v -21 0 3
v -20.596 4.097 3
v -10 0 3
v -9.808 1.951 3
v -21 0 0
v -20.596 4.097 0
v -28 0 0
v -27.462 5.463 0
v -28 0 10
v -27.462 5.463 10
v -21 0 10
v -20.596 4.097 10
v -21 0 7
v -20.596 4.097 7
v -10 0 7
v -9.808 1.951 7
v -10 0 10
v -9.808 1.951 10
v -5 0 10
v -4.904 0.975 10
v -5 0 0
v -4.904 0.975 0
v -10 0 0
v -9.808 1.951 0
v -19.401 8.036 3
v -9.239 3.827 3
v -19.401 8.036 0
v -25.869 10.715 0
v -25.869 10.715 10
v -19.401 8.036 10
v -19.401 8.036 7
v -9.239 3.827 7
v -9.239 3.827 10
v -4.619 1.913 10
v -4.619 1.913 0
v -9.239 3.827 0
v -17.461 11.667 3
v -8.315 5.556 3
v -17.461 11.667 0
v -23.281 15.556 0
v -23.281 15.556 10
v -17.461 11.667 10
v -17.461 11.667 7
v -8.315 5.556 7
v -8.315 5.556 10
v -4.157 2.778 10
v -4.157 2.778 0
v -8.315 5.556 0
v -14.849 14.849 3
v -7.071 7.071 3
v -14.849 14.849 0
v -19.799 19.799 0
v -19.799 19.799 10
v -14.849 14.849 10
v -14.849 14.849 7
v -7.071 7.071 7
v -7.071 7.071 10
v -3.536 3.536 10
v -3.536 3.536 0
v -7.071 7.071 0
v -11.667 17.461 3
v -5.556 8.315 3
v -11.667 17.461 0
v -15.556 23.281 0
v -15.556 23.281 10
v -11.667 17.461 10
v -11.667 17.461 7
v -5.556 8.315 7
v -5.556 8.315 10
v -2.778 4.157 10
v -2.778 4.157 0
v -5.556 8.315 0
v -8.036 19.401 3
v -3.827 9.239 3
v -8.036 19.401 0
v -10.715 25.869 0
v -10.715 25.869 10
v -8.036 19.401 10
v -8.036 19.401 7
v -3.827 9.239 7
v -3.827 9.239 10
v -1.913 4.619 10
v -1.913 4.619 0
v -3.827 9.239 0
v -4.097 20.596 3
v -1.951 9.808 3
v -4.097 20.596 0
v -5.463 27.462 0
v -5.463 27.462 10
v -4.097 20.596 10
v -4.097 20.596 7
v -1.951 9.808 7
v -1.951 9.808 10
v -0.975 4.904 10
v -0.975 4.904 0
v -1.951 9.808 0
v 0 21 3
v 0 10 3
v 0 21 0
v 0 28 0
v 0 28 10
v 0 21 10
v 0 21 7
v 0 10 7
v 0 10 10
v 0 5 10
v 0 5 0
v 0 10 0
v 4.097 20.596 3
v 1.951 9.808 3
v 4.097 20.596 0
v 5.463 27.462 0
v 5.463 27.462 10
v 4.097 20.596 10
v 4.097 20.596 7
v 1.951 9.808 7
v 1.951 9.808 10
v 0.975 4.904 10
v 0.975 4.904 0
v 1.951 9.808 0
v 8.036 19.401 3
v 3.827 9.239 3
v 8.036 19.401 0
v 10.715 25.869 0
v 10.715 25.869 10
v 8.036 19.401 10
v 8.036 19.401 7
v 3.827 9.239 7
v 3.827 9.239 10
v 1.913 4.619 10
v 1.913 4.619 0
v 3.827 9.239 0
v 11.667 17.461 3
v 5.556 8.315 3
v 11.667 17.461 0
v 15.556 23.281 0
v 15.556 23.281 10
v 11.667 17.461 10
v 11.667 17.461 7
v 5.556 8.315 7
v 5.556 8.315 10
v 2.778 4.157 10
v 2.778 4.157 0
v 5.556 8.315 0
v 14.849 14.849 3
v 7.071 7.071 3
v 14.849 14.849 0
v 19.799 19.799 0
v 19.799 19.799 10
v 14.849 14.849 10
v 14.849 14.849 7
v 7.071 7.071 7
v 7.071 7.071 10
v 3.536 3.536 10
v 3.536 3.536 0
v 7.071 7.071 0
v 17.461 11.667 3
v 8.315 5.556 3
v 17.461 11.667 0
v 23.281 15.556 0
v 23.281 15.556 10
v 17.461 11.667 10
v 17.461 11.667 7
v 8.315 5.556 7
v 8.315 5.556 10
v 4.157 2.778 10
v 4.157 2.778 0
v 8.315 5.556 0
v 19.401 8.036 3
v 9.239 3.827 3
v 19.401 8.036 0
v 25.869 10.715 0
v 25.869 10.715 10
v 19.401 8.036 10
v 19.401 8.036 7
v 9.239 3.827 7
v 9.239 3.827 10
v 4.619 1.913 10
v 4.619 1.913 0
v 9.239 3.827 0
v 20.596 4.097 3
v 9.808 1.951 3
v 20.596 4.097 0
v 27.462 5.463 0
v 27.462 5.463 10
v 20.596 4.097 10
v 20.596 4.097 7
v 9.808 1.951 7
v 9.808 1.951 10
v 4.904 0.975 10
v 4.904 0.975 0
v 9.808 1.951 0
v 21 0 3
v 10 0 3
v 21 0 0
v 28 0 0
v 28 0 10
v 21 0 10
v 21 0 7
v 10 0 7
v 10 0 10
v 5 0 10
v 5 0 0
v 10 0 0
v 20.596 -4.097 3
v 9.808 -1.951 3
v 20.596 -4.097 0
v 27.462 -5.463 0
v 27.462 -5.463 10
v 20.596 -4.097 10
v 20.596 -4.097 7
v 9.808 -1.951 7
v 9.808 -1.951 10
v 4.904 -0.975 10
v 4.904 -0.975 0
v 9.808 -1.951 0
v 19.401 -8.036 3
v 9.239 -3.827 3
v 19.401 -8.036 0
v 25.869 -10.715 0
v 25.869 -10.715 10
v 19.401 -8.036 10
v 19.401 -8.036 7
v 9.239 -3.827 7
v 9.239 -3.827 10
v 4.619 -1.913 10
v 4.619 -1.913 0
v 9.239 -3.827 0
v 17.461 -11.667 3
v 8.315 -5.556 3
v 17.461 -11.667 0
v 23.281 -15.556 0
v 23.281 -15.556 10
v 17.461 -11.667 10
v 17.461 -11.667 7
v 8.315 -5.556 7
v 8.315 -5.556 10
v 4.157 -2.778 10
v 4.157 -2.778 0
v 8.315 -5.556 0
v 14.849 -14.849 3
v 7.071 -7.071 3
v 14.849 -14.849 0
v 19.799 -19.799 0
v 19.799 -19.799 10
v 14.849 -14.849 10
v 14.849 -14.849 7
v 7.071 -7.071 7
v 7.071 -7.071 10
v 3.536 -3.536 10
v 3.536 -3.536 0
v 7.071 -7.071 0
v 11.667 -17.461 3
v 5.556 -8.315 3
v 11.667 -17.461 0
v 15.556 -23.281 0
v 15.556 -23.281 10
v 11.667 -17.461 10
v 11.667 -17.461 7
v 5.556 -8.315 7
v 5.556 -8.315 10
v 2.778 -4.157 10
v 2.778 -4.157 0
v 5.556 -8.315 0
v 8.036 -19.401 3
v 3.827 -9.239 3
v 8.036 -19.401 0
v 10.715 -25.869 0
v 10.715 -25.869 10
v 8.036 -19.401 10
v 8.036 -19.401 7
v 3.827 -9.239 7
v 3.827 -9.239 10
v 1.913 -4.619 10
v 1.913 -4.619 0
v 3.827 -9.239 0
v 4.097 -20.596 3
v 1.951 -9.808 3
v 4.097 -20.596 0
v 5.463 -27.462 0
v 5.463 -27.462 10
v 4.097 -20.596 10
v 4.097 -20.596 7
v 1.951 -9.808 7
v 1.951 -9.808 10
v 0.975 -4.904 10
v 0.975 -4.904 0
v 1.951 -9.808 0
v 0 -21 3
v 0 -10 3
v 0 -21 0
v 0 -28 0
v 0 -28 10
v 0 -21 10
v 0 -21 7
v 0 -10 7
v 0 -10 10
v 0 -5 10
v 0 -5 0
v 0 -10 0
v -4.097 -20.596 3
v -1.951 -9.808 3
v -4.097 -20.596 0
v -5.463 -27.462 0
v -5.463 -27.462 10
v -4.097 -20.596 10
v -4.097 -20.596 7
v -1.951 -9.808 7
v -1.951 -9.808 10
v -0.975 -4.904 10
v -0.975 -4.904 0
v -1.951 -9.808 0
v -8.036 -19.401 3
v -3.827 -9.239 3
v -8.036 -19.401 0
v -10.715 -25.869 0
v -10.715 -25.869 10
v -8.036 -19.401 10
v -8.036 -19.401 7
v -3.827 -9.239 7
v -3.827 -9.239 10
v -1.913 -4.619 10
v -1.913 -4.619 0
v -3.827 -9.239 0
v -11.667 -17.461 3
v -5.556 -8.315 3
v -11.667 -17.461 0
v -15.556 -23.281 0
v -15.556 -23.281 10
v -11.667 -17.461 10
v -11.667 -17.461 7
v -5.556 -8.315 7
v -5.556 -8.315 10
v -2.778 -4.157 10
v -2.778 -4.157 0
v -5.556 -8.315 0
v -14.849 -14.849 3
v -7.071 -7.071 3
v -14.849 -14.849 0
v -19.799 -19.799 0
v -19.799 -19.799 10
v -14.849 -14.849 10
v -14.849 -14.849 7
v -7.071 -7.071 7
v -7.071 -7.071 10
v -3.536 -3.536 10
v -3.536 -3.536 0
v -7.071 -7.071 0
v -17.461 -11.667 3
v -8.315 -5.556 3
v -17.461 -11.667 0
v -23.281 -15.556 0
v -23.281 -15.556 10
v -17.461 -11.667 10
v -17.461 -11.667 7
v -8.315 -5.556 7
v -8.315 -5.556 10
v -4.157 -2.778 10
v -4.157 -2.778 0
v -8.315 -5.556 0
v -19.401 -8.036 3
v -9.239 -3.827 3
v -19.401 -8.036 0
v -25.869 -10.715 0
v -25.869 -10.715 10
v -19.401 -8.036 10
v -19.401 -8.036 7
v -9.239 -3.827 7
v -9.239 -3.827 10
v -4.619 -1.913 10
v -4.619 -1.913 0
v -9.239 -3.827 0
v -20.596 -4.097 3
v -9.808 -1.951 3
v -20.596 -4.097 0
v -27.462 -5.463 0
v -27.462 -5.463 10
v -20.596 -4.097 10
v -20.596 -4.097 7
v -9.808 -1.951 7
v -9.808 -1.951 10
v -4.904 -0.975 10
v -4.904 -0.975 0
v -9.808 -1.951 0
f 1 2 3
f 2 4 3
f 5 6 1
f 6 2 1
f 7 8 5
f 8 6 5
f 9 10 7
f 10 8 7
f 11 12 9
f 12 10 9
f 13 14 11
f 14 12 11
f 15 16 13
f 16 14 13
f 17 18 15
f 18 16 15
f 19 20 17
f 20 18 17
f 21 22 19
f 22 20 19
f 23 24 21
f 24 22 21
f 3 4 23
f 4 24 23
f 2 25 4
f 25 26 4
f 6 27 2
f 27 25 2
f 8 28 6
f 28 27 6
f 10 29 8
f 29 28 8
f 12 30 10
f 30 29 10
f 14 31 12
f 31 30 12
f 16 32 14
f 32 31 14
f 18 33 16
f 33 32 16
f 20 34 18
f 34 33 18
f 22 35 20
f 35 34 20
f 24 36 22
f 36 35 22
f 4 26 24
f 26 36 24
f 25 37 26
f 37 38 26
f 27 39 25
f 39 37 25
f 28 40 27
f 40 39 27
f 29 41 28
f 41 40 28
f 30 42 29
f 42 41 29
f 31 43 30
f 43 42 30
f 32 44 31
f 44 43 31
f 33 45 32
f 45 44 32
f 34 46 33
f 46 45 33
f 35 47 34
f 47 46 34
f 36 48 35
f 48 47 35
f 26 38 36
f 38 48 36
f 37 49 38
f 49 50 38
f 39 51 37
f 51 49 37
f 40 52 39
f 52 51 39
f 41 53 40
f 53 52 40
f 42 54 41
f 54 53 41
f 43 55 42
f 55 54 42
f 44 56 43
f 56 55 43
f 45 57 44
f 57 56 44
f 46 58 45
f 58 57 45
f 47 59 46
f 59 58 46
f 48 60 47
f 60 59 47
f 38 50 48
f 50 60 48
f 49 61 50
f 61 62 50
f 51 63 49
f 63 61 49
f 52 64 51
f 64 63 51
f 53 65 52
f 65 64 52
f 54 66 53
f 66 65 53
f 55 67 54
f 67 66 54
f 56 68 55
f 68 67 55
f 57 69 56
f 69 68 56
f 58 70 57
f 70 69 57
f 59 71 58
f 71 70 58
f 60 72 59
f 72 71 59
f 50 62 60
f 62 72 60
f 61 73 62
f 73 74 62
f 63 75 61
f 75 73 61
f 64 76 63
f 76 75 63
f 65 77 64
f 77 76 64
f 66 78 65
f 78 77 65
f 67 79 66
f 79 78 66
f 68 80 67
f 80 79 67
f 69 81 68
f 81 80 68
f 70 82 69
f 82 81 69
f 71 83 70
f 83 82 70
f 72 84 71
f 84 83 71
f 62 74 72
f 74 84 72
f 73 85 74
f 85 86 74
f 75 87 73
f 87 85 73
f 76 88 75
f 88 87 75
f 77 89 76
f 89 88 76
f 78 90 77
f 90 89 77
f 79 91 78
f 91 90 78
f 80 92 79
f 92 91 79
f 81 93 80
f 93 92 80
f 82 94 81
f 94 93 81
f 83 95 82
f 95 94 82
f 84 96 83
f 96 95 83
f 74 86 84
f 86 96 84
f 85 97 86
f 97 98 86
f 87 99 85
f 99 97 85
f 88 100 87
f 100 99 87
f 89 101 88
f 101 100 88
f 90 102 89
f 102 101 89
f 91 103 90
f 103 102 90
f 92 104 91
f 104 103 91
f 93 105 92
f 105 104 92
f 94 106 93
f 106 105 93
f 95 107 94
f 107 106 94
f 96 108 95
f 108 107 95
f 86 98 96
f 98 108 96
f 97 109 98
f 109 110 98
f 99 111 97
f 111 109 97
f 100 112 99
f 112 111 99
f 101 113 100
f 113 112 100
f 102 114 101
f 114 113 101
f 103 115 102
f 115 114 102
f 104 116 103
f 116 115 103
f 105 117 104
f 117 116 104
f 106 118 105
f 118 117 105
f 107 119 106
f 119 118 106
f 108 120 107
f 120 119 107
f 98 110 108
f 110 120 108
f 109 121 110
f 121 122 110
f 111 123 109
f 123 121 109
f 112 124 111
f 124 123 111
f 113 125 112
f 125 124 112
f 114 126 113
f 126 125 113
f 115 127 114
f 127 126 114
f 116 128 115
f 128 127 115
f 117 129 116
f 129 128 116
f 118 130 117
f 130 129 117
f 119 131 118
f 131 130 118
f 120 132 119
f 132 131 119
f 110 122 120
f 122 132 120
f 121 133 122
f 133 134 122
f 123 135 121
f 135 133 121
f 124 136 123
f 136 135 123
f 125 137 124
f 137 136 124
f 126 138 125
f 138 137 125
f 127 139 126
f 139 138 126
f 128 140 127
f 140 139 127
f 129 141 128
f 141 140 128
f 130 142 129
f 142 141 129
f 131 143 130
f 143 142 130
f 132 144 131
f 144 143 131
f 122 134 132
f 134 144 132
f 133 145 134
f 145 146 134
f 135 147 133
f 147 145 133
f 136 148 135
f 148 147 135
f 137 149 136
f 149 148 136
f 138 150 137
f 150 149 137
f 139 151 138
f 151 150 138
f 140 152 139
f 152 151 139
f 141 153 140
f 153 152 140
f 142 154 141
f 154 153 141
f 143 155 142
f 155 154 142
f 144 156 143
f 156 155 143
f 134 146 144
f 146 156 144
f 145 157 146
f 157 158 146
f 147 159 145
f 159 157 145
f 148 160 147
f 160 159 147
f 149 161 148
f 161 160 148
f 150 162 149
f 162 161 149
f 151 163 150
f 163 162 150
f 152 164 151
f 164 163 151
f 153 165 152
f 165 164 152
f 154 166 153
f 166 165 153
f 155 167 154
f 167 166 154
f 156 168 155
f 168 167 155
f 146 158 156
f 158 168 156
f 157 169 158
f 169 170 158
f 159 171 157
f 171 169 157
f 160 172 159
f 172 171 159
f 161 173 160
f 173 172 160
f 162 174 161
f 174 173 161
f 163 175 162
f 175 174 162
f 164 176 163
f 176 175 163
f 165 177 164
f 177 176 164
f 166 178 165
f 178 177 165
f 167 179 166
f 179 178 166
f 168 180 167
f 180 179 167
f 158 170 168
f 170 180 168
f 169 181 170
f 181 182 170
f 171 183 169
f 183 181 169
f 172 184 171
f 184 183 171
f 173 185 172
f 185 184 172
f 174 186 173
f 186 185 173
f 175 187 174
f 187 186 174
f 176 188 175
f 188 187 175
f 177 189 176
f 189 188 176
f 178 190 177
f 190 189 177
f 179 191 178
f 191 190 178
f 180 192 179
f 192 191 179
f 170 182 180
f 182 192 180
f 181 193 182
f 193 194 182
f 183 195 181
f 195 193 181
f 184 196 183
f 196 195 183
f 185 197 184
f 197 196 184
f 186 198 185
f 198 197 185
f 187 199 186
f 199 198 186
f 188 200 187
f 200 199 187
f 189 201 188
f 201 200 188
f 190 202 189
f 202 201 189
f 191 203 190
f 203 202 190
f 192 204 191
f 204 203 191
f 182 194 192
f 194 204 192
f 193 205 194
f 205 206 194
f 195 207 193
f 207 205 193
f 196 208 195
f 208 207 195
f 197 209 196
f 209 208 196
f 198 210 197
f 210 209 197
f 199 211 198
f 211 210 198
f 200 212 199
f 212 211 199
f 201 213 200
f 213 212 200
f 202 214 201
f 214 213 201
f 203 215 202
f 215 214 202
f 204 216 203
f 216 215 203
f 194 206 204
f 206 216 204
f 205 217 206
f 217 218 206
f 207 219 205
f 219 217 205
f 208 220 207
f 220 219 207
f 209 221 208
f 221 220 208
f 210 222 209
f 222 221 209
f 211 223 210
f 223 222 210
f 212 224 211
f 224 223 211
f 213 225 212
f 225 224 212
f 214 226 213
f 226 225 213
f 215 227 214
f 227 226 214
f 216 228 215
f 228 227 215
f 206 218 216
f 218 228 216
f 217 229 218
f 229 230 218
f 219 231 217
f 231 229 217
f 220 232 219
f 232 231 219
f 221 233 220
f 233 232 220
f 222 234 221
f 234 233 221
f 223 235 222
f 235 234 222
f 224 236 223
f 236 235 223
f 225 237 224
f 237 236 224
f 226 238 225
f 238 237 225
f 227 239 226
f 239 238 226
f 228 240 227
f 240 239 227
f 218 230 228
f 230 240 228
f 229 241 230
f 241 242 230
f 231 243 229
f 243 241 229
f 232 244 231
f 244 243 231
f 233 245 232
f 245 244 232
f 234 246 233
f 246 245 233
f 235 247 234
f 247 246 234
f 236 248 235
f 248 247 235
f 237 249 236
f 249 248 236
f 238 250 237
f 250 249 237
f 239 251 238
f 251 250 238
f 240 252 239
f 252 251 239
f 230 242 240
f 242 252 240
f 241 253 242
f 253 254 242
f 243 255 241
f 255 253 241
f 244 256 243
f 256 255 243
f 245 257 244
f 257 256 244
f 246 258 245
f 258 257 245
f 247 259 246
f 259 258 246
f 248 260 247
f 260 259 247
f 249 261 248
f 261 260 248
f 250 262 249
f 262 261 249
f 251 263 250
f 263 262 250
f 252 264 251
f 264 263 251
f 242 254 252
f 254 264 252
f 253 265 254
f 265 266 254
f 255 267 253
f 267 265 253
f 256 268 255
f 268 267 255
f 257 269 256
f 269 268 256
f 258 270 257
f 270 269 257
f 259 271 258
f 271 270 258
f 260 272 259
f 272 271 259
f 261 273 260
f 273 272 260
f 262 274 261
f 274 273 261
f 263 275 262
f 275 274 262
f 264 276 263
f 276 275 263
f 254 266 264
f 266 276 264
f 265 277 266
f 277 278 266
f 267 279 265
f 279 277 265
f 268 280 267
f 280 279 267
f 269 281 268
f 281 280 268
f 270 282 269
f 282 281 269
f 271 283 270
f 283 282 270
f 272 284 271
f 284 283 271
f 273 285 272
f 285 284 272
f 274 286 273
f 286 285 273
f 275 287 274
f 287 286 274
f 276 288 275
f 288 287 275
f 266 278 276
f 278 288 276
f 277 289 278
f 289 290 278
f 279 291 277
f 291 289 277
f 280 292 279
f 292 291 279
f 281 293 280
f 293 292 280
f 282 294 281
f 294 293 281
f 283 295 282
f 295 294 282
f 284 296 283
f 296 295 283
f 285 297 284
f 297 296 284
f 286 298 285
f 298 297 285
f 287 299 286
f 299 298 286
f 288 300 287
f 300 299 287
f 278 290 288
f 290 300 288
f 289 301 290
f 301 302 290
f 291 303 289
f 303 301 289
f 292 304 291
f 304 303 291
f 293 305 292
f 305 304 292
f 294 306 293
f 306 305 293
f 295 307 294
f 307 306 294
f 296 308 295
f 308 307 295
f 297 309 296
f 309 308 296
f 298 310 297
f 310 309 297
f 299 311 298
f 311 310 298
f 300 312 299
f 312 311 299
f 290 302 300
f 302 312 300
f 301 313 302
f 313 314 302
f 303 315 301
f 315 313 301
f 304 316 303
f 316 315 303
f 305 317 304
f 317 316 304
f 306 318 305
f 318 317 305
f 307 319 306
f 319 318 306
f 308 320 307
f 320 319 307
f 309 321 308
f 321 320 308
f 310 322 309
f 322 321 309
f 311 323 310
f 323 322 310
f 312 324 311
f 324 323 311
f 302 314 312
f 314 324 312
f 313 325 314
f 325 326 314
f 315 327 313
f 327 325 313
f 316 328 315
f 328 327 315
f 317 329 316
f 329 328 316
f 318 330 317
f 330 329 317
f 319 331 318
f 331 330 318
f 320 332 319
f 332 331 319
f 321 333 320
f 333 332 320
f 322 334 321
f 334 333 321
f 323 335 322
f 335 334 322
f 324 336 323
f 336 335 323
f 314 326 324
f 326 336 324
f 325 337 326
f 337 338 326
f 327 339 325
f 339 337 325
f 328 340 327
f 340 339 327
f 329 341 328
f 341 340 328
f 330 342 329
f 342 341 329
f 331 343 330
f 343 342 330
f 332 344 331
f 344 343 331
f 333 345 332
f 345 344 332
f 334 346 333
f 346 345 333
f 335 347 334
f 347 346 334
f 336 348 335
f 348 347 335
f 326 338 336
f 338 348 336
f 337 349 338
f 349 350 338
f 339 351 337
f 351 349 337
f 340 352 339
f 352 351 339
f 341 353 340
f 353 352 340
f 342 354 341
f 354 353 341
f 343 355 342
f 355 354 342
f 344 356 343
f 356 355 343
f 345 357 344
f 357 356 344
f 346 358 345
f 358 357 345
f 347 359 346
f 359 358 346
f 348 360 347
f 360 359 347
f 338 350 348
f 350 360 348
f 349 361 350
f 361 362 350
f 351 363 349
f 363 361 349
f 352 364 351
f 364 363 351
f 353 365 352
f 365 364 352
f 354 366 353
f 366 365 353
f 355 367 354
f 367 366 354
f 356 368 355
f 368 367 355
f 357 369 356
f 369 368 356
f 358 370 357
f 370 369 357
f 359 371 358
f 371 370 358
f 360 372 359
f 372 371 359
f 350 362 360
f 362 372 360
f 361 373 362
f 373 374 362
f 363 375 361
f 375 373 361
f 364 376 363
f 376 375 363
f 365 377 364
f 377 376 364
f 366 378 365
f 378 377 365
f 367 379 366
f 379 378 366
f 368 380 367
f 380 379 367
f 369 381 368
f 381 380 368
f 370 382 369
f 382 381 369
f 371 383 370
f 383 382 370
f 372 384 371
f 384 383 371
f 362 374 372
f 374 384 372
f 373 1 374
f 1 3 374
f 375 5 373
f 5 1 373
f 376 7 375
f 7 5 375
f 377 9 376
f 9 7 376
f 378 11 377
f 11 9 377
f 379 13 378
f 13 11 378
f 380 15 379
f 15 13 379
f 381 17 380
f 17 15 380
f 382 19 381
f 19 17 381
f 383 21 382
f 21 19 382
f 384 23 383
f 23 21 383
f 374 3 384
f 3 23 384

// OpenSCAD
$fn = 32;

// ----------------------------------------------------------------------
// Revolved part: handwheel R28
// ----------------------------------------------------------------------

// --- parameters (mm) ---
bore_r = 5;               // bore radius
rim_r = 28;               // rim radius
rim_w = 7;                // rim axial width
rim_t = 10;               // rim diameter height
hub_r = 10;               // hub radius
web_t = 4;                // web thickness
revolve_angle = 360;      // revolve sweep, degrees

bore_d = 2 * bore_r;
rim_d = 2 * rim_r;
hub_d = 2 * hub_r;

profile = [[5, 0], [10, 0], [10, 3], [21, 3], [21, 0], [28, 0], [28, 10], [21, 10], [21, 7], [10, 7], [10, 10], [5, 10]];  // primary outline, 12 points, counter clockwise

// --- the one profile operation ---
rotate_extrude(angle = revolve_angle) polygon(points = profile);
